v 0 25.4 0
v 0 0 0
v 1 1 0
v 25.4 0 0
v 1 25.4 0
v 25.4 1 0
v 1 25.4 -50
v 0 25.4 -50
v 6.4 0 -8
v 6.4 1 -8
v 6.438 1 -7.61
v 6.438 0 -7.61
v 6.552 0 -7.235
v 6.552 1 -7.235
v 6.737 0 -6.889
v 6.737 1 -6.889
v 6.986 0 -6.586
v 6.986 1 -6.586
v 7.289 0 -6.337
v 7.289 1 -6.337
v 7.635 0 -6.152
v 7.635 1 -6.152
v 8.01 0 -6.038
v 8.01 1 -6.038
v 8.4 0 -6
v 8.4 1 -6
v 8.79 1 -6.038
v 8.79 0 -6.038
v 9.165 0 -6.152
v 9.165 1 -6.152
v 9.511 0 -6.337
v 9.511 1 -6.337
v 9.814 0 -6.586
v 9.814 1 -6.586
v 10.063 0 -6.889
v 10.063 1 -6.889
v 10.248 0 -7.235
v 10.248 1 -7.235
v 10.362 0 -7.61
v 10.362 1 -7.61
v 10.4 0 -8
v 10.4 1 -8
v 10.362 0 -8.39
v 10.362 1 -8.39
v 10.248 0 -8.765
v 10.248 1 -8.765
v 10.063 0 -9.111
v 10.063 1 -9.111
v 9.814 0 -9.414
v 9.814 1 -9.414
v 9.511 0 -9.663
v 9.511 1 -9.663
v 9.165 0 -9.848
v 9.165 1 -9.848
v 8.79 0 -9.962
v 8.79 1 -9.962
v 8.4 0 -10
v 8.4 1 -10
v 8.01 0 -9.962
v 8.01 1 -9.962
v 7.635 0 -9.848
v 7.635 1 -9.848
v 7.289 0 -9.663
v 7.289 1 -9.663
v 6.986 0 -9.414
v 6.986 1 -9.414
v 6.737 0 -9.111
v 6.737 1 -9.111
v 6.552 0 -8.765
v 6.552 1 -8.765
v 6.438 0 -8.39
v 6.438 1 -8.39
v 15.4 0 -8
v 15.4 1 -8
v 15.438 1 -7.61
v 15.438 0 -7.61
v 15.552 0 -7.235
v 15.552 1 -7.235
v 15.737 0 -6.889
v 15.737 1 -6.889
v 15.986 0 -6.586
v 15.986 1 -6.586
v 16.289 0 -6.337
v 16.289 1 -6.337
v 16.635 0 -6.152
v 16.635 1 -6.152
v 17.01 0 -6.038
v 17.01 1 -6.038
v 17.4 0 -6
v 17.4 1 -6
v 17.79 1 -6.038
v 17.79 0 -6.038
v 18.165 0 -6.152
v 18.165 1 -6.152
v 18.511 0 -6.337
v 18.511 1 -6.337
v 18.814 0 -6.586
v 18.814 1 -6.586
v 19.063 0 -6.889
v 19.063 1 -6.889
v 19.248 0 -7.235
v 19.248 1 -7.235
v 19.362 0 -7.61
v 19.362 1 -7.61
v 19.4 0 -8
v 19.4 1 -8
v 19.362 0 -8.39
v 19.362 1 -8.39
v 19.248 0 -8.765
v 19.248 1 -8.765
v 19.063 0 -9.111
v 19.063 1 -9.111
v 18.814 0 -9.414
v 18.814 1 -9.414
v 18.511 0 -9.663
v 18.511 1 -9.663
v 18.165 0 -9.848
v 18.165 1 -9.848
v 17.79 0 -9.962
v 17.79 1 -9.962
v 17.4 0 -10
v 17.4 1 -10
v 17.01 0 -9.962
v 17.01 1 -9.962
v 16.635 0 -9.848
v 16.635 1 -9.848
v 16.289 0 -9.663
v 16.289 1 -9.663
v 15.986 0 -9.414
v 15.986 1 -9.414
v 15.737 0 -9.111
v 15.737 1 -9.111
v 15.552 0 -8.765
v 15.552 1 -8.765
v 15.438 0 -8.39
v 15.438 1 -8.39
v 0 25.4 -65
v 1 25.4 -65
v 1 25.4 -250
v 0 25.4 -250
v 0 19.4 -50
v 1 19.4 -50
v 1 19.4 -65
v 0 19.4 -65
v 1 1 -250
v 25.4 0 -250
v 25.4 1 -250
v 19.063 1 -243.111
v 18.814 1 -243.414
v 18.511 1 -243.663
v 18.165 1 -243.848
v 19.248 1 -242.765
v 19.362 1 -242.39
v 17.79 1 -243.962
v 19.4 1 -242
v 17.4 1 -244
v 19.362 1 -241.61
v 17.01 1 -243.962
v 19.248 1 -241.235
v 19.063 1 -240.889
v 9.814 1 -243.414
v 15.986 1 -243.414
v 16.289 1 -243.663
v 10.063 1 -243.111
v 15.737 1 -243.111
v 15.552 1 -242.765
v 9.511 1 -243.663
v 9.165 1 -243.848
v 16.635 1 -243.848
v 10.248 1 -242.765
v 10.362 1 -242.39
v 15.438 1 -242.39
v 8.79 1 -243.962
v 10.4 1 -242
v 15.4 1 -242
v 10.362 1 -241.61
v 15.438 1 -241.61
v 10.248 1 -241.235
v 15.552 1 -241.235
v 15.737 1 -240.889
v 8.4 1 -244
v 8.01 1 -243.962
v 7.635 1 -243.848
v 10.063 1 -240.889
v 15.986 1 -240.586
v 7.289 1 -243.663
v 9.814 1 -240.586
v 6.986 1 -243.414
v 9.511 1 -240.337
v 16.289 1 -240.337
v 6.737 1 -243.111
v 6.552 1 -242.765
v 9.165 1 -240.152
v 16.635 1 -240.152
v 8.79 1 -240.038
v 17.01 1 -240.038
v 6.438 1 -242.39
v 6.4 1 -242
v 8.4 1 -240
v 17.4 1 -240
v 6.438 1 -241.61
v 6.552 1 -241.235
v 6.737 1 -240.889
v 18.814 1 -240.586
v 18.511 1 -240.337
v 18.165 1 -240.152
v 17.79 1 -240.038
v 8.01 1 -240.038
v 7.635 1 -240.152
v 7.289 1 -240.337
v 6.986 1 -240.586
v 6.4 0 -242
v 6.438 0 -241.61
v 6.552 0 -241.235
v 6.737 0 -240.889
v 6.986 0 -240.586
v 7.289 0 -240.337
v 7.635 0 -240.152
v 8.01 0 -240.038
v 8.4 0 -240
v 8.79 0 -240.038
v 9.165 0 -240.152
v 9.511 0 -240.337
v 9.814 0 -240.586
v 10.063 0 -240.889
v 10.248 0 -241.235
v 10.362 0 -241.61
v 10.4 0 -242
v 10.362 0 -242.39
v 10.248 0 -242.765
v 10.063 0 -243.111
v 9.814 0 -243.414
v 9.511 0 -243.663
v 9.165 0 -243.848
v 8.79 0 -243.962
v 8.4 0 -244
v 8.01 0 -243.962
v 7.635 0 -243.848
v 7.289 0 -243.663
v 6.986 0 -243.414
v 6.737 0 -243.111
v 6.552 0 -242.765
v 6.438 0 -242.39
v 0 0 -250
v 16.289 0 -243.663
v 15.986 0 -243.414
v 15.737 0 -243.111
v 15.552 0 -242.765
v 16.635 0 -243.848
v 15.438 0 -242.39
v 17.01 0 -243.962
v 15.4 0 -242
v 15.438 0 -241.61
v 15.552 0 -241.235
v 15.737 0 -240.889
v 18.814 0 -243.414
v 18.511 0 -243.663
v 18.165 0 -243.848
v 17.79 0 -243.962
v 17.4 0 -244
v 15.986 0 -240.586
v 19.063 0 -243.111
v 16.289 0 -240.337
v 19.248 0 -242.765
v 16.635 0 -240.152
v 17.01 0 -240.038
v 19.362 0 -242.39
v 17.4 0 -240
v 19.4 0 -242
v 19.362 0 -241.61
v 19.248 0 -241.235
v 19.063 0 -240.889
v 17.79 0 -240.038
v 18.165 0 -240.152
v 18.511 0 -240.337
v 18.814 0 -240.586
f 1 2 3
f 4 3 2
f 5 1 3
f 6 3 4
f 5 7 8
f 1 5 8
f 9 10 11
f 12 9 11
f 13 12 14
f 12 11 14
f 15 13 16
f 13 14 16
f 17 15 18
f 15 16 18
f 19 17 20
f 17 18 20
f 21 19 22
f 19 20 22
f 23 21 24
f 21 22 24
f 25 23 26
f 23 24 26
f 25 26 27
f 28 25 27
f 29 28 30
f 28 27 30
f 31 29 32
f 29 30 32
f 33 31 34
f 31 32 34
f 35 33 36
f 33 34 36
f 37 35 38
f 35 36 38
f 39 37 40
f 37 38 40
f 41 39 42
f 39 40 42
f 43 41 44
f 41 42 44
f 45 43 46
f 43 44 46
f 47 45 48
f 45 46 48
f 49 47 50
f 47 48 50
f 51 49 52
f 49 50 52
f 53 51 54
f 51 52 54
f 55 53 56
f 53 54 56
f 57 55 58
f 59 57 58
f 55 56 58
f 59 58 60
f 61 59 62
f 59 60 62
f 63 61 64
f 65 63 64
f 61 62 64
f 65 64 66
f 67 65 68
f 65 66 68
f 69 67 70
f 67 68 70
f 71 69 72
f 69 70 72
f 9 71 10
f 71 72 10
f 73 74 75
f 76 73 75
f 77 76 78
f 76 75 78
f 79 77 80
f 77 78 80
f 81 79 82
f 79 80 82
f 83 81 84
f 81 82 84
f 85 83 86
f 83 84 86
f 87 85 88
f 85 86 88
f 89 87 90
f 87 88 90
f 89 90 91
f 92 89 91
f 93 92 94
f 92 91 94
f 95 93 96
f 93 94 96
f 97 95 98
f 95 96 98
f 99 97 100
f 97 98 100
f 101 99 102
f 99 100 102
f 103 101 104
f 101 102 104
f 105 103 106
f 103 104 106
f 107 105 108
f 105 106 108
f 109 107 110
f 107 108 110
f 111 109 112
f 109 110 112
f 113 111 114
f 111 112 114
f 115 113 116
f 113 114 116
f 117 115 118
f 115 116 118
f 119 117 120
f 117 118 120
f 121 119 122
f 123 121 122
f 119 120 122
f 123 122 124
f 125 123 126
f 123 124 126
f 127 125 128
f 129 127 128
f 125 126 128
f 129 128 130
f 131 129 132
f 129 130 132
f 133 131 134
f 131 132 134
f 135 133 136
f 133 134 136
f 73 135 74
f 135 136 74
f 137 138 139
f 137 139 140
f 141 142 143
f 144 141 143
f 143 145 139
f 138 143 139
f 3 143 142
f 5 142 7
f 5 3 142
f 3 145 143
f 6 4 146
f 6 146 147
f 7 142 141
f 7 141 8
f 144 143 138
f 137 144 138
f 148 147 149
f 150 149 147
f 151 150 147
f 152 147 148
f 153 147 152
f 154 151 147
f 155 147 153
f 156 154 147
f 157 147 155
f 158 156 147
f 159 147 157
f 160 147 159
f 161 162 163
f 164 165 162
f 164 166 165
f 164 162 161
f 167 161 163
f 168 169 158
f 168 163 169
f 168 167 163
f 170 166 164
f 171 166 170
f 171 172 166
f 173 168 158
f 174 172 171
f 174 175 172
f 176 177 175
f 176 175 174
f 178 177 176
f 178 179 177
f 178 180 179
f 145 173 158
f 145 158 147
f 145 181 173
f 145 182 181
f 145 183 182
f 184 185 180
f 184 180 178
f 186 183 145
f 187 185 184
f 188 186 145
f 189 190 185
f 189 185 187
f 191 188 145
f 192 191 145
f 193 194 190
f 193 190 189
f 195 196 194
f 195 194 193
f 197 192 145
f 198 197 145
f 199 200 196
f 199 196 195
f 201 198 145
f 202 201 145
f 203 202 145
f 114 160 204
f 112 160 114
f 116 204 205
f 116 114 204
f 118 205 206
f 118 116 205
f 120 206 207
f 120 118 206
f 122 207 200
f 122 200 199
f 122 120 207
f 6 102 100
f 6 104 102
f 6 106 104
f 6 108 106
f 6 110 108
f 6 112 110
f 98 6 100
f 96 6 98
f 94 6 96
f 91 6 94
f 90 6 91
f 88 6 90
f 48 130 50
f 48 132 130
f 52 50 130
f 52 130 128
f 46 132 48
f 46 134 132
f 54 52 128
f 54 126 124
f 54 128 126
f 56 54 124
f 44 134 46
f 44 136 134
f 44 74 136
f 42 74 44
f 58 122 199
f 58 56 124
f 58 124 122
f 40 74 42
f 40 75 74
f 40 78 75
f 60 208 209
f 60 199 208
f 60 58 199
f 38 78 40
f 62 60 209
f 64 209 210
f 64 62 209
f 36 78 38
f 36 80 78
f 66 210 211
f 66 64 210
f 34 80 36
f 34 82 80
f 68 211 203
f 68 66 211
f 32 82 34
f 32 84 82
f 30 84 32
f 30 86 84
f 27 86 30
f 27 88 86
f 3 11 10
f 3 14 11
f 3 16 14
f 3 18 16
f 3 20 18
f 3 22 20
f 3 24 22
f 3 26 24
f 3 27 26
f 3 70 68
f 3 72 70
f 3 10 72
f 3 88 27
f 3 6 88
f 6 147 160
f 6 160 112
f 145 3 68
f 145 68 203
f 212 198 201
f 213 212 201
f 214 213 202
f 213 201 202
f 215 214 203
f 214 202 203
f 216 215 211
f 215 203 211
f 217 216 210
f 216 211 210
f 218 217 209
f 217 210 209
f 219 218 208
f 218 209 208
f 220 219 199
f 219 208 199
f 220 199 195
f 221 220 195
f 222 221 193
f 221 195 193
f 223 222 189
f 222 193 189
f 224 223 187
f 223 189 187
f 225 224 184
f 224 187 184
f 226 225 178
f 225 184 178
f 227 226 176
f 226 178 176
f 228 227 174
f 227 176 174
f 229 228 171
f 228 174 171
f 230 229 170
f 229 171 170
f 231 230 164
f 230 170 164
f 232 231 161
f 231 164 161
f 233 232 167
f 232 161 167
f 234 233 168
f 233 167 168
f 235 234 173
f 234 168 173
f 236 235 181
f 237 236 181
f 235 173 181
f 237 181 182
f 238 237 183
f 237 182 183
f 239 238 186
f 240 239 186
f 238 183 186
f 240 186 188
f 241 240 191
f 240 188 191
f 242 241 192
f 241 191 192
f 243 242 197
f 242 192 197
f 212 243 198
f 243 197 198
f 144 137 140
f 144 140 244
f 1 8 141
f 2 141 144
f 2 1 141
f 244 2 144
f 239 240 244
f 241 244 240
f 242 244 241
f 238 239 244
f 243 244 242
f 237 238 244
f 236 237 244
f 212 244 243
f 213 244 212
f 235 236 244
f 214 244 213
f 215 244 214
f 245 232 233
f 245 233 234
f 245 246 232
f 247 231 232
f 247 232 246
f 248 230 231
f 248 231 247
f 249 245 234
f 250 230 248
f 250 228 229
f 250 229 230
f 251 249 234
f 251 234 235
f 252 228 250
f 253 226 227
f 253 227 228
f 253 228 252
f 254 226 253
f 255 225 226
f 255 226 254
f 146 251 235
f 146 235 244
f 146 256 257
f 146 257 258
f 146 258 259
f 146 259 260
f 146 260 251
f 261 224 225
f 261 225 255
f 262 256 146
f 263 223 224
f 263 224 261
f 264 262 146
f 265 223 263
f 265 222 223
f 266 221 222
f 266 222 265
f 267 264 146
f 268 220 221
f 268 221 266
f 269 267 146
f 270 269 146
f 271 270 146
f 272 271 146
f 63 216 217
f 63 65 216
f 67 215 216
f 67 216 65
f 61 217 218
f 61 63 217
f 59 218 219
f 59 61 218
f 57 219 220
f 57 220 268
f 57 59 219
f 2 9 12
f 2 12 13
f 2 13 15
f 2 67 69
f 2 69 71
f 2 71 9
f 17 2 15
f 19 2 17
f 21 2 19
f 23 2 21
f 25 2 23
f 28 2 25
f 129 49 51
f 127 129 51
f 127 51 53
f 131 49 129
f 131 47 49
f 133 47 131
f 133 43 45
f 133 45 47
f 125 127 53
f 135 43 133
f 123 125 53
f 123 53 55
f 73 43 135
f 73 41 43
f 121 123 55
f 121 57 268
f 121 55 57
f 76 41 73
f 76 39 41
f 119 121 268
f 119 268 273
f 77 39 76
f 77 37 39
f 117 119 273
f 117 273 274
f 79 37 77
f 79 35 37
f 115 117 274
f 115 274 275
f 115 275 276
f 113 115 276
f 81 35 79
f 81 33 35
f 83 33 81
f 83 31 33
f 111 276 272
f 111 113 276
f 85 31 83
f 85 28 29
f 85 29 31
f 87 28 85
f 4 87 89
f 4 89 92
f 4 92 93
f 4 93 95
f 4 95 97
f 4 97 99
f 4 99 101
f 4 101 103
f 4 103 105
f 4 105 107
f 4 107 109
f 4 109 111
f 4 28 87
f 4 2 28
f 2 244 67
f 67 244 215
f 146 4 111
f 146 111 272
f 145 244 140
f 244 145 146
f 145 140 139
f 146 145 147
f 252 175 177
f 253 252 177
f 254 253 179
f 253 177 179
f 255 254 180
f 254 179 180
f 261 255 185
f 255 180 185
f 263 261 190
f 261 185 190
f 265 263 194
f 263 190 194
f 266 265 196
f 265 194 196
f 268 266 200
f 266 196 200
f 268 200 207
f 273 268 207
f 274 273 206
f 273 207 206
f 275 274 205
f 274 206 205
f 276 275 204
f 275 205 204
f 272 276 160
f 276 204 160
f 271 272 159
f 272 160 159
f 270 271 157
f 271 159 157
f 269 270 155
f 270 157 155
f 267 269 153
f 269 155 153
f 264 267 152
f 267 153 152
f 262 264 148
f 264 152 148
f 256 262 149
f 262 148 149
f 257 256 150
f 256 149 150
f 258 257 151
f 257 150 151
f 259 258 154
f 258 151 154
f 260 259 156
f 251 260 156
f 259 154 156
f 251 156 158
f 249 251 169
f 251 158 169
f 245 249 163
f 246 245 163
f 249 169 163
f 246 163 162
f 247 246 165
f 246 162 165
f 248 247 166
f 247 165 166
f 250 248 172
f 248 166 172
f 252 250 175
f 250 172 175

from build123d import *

# Parameters (mm, degrees)
BOSS_EXTRUDE1_DEPTH = 250
SKETCH2_R           = 2
CUT_EXTRUDE1_DEPTH  = 1
SKETCH3_W           = 15
SKETCH3_H           = 6
CUT_EXTRUDE2_DEPTH  = 1


with BuildPart() as part:
    # Sketch1 → Boss-Extrude1 (new body)
    with BuildSketch(Plane.XY):
        Polygon((0, 0), (25.4, 0), (25.4, 1), (1, 1), (1, 25.4), (0, 25.4), align=None)
    extrude(amount=-BOSS_EXTRUDE1_DEPTH)

    # Sketch2 → Cut-Extrude1 (cut)
    with BuildSketch(Plane(origin=(0, 1, 0), x_dir=(1, 0, 0), z_dir=(0, 1, 0))):
        with Locations(Location((8.4, 8, 0), (0, 0, 180))):
            Circle(SKETCH2_R)
        with Locations(Location((17.4, 8, 0), (0, 0, 180))):
            Circle(SKETCH2_R)
        with Locations(Location((8.4, 242, 0), (0, 0, 180))):
            Circle(SKETCH2_R)
        with Locations(Location((17.4, 242, 0), (0, 0, 180))):
            Circle(SKETCH2_R)
    extrude(amount=-CUT_EXTRUDE1_DEPTH, mode=Mode.SUBTRACT)

    # Sketch3 → Cut-Extrude2 (cut)
    with BuildSketch(Plane(origin=(1, 0, 0), x_dir=(0, 0, -1), z_dir=(1, 0, 0))):
        with Locations((57.5, 22.4)):
            Rectangle(SKETCH3_W, SKETCH3_H)
    extrude(amount=-CUT_EXTRUDE2_DEPTH, mode=Mode.SUBTRACT)


solid = part.part
